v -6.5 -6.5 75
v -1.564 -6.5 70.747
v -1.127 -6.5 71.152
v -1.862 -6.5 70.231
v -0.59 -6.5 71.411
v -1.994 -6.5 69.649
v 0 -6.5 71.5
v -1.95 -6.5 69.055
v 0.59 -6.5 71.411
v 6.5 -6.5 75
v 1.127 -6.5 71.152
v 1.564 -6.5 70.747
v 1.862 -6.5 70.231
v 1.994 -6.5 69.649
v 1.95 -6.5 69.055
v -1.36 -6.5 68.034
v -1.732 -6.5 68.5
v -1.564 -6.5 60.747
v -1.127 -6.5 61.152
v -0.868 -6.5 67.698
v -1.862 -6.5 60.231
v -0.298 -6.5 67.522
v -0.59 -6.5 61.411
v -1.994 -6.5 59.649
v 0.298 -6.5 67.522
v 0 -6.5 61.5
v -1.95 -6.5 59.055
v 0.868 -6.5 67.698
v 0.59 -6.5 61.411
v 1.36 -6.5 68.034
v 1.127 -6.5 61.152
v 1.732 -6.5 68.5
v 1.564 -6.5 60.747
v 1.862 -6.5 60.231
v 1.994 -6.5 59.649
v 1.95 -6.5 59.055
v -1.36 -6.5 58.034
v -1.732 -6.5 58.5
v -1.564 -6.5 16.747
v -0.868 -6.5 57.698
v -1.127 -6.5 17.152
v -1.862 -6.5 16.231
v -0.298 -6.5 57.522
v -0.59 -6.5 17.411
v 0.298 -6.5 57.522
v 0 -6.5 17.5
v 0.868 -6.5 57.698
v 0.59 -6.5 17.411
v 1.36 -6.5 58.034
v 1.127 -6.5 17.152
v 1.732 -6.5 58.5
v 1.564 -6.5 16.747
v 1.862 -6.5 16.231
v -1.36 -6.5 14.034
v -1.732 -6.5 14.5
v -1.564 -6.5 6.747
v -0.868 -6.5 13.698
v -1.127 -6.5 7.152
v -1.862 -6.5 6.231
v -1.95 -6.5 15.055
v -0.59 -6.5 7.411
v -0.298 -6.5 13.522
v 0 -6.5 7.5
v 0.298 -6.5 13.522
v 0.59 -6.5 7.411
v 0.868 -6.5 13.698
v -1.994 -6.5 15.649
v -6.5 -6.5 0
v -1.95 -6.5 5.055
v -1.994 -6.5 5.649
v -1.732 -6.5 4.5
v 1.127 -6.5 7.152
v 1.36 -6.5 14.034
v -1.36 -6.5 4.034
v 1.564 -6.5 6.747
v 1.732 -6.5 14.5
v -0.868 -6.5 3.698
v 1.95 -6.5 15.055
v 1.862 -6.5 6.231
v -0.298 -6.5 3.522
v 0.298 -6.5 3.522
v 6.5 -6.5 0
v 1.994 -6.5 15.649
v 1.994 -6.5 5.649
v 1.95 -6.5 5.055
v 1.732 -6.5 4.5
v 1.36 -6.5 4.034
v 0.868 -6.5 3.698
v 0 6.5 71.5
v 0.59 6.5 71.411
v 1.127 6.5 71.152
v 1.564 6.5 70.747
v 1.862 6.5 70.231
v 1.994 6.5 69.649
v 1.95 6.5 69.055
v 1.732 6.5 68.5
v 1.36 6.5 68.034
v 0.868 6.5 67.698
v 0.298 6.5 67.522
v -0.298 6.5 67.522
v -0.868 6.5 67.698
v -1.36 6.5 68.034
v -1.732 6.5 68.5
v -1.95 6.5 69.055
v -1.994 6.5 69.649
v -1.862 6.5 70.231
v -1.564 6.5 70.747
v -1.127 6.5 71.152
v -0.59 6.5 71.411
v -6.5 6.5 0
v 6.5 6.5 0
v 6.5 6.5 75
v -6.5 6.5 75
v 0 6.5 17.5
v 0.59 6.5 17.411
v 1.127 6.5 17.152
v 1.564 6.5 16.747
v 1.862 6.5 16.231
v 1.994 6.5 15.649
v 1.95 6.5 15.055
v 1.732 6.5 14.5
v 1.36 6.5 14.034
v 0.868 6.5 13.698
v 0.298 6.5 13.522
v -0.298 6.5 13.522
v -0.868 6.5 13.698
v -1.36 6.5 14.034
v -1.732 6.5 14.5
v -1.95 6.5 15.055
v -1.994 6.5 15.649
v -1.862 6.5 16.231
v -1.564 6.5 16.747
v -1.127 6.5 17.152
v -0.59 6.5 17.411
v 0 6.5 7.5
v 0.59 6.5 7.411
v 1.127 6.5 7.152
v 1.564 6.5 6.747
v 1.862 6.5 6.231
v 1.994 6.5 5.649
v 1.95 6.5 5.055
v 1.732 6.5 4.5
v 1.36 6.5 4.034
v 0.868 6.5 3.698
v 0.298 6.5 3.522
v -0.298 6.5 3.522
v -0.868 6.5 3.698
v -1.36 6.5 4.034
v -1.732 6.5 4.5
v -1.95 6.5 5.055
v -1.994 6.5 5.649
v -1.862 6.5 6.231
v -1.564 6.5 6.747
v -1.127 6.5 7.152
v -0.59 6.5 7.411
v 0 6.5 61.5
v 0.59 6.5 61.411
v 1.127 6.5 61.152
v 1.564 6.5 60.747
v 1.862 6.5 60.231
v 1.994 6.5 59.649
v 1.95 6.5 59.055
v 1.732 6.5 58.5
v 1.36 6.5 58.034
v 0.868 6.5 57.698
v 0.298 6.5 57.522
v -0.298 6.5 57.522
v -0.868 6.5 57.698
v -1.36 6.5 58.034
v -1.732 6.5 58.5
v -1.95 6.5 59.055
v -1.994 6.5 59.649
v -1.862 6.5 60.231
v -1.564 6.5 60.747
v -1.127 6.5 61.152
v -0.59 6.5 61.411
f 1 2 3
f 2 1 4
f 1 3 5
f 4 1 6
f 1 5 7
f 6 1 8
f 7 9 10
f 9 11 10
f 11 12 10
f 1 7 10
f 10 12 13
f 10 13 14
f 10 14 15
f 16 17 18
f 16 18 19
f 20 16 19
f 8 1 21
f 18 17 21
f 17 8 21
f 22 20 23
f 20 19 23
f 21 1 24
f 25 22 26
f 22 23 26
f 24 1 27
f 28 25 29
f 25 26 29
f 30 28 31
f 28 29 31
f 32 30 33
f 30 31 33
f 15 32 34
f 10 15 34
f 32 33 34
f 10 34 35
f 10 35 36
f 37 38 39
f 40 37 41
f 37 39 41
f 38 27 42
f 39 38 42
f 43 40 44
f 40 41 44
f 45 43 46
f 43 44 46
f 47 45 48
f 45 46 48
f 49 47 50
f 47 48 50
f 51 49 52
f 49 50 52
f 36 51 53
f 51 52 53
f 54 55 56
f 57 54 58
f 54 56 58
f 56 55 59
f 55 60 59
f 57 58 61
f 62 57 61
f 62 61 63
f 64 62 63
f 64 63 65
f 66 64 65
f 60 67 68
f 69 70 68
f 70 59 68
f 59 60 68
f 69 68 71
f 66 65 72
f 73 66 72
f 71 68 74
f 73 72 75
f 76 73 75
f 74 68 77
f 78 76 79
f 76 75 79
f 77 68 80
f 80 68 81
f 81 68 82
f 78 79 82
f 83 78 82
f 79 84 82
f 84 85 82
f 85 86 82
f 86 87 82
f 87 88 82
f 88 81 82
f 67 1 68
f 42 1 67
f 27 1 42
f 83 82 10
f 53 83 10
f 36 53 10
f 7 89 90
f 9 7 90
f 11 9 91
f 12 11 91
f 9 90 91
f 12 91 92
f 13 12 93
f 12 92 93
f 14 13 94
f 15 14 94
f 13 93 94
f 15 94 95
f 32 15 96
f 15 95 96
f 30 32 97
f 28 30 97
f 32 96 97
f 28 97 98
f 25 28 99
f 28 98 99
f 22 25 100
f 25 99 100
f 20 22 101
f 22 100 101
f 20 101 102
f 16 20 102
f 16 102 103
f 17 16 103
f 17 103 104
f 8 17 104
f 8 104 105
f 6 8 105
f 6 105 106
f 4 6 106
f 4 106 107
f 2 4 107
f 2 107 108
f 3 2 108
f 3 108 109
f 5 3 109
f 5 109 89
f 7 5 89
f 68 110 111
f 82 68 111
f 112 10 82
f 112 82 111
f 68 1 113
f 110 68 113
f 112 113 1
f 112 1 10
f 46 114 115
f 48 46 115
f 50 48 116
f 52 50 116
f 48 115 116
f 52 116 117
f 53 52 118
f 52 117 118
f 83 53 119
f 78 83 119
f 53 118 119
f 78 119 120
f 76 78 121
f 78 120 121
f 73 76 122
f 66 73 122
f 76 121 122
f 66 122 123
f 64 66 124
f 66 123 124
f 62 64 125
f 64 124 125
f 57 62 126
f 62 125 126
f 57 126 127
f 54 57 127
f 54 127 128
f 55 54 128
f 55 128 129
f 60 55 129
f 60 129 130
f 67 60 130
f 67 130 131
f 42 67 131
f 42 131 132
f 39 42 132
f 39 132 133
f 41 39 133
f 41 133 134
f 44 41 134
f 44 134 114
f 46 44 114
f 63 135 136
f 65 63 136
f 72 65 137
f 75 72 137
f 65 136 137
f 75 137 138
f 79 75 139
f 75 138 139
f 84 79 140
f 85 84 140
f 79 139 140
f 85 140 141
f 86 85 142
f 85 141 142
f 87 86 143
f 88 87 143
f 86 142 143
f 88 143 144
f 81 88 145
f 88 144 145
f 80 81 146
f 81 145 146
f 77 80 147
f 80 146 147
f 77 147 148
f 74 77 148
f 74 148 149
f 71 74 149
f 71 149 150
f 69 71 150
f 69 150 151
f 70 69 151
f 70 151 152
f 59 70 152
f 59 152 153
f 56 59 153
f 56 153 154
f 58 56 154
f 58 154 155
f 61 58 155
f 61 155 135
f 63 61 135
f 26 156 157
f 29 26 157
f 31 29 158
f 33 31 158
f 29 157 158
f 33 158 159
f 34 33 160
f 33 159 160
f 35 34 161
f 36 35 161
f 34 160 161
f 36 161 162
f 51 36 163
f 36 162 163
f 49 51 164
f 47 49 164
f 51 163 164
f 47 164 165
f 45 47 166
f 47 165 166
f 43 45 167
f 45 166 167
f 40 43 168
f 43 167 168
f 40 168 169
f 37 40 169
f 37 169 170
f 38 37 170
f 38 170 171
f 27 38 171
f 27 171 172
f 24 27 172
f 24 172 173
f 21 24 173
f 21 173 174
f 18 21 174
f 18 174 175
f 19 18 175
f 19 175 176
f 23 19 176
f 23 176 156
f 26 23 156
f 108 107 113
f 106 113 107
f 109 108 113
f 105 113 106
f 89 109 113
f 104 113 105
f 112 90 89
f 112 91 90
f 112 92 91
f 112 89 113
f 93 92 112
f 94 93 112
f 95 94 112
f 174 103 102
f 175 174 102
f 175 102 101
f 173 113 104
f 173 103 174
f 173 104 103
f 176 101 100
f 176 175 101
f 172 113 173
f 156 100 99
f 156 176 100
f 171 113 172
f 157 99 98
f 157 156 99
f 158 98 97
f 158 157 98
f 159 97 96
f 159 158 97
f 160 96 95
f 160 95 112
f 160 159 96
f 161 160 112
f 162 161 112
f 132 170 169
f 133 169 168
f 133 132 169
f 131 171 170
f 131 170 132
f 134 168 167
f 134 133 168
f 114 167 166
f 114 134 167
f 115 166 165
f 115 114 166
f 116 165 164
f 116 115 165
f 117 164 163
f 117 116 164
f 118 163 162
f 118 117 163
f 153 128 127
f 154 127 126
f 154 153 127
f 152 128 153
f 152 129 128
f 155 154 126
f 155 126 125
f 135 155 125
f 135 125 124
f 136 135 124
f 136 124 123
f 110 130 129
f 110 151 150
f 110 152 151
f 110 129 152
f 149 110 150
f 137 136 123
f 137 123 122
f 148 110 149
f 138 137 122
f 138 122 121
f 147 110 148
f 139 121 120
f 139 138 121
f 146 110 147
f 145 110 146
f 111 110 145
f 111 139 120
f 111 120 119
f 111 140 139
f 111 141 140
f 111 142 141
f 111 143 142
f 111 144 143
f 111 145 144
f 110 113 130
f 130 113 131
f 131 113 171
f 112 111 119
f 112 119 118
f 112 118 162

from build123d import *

# Parameters (mm, degrees)
SKETCH1_W           = 13
SKETCH1_H           = 13
BOSS_EXTRUDE1_DEPTH = 75
SKETCH2_R           = 2
CUT_EXTRUDE1_DEPTH  = 75


with BuildPart() as part:
    # Sketch1 → Boss-Extrude1 (new body)
    with BuildSketch(Plane.XY):
        Rectangle(SKETCH1_W, SKETCH1_H)
    extrude(amount=BOSS_EXTRUDE1_DEPTH)

    # Sketch2 → Cut-Extrude1 (cut)
    with BuildSketch(Plane(origin=(0, 6.5, 0), x_dir=(1, 0, 0), z_dir=(0, 1, 0))):
        with Locations(Location((0, -69.5, 0), (0, 0, 270))):
            Circle(SKETCH2_R)
        with Locations(Location((0, -59.5, 0), (0, 0, 270))):
            Circle(SKETCH2_R)
        with Locations(Location((0, -5.5, 0), (0, 0, 270))):
            Circle(SKETCH2_R)
        with Locations(Location((0, -15.5, 0), (0, 0, 270))):
            Circle(SKETCH2_R)
    extrude(amount=-CUT_EXTRUDE1_DEPTH, mode=Mode.SUBTRACT)


solid = part.part
